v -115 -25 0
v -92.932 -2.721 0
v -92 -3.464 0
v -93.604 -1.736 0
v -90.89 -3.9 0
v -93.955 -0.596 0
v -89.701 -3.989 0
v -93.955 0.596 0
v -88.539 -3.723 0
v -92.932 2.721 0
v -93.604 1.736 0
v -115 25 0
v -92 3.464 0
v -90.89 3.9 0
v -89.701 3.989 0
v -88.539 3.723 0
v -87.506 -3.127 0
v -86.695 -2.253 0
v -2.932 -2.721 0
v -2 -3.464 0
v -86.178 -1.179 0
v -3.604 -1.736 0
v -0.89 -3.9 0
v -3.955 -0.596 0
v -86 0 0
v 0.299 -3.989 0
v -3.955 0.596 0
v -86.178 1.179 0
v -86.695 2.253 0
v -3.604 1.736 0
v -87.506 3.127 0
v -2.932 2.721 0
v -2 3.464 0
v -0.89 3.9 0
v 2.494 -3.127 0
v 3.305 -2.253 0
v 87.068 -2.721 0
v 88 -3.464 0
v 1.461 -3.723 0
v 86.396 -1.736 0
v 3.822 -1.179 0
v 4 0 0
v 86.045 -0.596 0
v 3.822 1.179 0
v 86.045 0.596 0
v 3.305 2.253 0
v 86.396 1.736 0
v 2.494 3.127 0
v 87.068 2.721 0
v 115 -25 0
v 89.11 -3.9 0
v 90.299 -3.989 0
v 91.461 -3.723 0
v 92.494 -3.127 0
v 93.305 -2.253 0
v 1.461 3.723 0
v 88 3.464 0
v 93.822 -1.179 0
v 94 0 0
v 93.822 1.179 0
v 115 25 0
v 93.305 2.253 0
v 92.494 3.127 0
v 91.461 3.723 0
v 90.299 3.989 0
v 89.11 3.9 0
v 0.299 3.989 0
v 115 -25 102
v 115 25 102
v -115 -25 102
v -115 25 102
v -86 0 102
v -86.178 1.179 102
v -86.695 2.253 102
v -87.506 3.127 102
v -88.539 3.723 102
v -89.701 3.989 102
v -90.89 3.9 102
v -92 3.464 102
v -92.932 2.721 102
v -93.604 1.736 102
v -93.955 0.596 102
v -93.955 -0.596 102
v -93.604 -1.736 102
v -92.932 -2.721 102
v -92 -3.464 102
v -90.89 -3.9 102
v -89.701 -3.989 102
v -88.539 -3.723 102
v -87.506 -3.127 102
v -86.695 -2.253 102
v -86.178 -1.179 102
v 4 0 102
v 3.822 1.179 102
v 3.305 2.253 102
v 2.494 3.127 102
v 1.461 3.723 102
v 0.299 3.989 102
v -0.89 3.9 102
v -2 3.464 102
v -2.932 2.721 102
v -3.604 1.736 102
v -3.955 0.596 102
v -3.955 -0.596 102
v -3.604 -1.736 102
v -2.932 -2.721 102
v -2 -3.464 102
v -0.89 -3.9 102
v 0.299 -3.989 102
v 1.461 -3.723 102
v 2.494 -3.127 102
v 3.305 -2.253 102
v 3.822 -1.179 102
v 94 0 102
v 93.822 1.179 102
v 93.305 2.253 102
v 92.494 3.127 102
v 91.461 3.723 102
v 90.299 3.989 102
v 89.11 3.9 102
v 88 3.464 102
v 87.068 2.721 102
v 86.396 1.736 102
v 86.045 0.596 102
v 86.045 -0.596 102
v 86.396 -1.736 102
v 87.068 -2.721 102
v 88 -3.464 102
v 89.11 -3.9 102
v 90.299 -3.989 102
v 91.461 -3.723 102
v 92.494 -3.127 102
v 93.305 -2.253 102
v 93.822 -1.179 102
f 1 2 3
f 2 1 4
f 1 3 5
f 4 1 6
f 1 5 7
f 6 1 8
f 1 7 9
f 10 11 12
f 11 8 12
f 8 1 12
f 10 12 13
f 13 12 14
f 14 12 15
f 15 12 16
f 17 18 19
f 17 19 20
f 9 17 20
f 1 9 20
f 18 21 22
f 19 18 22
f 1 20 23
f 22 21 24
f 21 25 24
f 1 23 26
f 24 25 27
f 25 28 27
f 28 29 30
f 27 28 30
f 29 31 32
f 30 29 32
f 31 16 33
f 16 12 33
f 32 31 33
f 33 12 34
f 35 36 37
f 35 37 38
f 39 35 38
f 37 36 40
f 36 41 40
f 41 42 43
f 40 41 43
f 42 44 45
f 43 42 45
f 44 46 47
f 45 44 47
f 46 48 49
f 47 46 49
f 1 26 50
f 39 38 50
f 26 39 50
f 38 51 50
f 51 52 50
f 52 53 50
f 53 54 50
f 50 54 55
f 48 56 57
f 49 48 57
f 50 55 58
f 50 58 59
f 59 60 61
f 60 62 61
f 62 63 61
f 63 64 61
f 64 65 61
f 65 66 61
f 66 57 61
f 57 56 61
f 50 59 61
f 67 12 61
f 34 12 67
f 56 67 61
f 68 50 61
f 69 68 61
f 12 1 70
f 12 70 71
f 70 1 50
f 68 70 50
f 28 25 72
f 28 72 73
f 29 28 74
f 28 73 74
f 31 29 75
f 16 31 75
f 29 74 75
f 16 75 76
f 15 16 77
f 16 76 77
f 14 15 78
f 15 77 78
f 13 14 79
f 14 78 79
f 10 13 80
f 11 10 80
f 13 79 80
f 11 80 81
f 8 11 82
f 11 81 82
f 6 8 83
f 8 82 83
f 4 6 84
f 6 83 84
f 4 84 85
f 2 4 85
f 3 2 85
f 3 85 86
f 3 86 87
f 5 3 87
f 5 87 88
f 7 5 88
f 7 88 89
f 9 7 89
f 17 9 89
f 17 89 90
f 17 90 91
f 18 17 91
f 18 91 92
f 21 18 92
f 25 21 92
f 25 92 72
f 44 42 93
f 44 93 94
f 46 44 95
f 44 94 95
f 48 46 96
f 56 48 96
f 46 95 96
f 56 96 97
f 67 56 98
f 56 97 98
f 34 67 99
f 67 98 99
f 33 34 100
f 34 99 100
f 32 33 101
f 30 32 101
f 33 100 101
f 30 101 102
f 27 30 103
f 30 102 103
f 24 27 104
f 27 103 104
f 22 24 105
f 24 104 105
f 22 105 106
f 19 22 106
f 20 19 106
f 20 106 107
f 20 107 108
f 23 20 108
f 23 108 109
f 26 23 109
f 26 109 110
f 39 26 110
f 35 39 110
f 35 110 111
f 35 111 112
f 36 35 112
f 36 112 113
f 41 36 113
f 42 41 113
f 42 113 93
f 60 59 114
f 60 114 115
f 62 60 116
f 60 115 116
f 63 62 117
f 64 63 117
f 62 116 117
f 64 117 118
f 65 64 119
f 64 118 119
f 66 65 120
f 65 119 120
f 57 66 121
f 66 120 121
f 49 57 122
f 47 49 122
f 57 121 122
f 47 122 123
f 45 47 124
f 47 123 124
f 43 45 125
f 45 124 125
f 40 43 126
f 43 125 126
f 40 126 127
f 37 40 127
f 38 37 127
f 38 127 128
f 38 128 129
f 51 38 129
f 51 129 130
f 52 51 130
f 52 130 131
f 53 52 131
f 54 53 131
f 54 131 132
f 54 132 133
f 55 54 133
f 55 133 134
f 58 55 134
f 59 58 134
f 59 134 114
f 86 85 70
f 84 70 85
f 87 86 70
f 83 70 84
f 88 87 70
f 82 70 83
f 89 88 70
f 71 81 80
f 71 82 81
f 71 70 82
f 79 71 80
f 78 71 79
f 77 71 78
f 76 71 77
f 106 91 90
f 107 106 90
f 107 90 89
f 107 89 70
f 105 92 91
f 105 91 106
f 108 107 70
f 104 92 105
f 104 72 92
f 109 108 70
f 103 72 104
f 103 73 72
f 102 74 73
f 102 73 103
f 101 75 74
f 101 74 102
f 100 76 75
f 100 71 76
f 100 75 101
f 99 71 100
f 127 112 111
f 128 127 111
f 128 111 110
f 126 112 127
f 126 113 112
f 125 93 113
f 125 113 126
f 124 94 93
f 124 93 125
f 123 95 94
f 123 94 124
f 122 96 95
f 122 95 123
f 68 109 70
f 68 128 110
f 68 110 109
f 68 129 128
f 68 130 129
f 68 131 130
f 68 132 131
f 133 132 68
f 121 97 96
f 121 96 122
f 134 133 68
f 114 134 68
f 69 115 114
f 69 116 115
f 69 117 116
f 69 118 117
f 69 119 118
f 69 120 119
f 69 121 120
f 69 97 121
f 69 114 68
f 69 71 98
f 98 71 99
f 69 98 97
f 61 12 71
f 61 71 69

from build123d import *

# Parameters (mm, degrees)
SKETCH2_W           = 230
SKETCH2_H           = 50
BOSS_EXTRUDE1_DEPTH = 102
SKETCH3_R           = 4
CUT_EXTRUDE1_DEPTH  = 156.73695772


with BuildPart() as part:
    # Sketch2 → Boss-Extrude1 (new body)
    with BuildSketch(Plane.XY):
        Rectangle(SKETCH2_W, SKETCH2_H)
    extrude(amount=BOSS_EXTRUDE1_DEPTH)

    # Sketch3 → Cut-Extrude1 (cut, through all)
    with BuildSketch(Plane.XY.offset(102)):
        Circle(SKETCH3_R)
        with Locations((90, 0)):
            Circle(SKETCH3_R)
        with Locations((-90, 0)):
            Circle(SKETCH3_R)
    extrude(amount=-CUT_EXTRUDE1_DEPTH, mode=Mode.SUBTRACT)


solid = part.part
